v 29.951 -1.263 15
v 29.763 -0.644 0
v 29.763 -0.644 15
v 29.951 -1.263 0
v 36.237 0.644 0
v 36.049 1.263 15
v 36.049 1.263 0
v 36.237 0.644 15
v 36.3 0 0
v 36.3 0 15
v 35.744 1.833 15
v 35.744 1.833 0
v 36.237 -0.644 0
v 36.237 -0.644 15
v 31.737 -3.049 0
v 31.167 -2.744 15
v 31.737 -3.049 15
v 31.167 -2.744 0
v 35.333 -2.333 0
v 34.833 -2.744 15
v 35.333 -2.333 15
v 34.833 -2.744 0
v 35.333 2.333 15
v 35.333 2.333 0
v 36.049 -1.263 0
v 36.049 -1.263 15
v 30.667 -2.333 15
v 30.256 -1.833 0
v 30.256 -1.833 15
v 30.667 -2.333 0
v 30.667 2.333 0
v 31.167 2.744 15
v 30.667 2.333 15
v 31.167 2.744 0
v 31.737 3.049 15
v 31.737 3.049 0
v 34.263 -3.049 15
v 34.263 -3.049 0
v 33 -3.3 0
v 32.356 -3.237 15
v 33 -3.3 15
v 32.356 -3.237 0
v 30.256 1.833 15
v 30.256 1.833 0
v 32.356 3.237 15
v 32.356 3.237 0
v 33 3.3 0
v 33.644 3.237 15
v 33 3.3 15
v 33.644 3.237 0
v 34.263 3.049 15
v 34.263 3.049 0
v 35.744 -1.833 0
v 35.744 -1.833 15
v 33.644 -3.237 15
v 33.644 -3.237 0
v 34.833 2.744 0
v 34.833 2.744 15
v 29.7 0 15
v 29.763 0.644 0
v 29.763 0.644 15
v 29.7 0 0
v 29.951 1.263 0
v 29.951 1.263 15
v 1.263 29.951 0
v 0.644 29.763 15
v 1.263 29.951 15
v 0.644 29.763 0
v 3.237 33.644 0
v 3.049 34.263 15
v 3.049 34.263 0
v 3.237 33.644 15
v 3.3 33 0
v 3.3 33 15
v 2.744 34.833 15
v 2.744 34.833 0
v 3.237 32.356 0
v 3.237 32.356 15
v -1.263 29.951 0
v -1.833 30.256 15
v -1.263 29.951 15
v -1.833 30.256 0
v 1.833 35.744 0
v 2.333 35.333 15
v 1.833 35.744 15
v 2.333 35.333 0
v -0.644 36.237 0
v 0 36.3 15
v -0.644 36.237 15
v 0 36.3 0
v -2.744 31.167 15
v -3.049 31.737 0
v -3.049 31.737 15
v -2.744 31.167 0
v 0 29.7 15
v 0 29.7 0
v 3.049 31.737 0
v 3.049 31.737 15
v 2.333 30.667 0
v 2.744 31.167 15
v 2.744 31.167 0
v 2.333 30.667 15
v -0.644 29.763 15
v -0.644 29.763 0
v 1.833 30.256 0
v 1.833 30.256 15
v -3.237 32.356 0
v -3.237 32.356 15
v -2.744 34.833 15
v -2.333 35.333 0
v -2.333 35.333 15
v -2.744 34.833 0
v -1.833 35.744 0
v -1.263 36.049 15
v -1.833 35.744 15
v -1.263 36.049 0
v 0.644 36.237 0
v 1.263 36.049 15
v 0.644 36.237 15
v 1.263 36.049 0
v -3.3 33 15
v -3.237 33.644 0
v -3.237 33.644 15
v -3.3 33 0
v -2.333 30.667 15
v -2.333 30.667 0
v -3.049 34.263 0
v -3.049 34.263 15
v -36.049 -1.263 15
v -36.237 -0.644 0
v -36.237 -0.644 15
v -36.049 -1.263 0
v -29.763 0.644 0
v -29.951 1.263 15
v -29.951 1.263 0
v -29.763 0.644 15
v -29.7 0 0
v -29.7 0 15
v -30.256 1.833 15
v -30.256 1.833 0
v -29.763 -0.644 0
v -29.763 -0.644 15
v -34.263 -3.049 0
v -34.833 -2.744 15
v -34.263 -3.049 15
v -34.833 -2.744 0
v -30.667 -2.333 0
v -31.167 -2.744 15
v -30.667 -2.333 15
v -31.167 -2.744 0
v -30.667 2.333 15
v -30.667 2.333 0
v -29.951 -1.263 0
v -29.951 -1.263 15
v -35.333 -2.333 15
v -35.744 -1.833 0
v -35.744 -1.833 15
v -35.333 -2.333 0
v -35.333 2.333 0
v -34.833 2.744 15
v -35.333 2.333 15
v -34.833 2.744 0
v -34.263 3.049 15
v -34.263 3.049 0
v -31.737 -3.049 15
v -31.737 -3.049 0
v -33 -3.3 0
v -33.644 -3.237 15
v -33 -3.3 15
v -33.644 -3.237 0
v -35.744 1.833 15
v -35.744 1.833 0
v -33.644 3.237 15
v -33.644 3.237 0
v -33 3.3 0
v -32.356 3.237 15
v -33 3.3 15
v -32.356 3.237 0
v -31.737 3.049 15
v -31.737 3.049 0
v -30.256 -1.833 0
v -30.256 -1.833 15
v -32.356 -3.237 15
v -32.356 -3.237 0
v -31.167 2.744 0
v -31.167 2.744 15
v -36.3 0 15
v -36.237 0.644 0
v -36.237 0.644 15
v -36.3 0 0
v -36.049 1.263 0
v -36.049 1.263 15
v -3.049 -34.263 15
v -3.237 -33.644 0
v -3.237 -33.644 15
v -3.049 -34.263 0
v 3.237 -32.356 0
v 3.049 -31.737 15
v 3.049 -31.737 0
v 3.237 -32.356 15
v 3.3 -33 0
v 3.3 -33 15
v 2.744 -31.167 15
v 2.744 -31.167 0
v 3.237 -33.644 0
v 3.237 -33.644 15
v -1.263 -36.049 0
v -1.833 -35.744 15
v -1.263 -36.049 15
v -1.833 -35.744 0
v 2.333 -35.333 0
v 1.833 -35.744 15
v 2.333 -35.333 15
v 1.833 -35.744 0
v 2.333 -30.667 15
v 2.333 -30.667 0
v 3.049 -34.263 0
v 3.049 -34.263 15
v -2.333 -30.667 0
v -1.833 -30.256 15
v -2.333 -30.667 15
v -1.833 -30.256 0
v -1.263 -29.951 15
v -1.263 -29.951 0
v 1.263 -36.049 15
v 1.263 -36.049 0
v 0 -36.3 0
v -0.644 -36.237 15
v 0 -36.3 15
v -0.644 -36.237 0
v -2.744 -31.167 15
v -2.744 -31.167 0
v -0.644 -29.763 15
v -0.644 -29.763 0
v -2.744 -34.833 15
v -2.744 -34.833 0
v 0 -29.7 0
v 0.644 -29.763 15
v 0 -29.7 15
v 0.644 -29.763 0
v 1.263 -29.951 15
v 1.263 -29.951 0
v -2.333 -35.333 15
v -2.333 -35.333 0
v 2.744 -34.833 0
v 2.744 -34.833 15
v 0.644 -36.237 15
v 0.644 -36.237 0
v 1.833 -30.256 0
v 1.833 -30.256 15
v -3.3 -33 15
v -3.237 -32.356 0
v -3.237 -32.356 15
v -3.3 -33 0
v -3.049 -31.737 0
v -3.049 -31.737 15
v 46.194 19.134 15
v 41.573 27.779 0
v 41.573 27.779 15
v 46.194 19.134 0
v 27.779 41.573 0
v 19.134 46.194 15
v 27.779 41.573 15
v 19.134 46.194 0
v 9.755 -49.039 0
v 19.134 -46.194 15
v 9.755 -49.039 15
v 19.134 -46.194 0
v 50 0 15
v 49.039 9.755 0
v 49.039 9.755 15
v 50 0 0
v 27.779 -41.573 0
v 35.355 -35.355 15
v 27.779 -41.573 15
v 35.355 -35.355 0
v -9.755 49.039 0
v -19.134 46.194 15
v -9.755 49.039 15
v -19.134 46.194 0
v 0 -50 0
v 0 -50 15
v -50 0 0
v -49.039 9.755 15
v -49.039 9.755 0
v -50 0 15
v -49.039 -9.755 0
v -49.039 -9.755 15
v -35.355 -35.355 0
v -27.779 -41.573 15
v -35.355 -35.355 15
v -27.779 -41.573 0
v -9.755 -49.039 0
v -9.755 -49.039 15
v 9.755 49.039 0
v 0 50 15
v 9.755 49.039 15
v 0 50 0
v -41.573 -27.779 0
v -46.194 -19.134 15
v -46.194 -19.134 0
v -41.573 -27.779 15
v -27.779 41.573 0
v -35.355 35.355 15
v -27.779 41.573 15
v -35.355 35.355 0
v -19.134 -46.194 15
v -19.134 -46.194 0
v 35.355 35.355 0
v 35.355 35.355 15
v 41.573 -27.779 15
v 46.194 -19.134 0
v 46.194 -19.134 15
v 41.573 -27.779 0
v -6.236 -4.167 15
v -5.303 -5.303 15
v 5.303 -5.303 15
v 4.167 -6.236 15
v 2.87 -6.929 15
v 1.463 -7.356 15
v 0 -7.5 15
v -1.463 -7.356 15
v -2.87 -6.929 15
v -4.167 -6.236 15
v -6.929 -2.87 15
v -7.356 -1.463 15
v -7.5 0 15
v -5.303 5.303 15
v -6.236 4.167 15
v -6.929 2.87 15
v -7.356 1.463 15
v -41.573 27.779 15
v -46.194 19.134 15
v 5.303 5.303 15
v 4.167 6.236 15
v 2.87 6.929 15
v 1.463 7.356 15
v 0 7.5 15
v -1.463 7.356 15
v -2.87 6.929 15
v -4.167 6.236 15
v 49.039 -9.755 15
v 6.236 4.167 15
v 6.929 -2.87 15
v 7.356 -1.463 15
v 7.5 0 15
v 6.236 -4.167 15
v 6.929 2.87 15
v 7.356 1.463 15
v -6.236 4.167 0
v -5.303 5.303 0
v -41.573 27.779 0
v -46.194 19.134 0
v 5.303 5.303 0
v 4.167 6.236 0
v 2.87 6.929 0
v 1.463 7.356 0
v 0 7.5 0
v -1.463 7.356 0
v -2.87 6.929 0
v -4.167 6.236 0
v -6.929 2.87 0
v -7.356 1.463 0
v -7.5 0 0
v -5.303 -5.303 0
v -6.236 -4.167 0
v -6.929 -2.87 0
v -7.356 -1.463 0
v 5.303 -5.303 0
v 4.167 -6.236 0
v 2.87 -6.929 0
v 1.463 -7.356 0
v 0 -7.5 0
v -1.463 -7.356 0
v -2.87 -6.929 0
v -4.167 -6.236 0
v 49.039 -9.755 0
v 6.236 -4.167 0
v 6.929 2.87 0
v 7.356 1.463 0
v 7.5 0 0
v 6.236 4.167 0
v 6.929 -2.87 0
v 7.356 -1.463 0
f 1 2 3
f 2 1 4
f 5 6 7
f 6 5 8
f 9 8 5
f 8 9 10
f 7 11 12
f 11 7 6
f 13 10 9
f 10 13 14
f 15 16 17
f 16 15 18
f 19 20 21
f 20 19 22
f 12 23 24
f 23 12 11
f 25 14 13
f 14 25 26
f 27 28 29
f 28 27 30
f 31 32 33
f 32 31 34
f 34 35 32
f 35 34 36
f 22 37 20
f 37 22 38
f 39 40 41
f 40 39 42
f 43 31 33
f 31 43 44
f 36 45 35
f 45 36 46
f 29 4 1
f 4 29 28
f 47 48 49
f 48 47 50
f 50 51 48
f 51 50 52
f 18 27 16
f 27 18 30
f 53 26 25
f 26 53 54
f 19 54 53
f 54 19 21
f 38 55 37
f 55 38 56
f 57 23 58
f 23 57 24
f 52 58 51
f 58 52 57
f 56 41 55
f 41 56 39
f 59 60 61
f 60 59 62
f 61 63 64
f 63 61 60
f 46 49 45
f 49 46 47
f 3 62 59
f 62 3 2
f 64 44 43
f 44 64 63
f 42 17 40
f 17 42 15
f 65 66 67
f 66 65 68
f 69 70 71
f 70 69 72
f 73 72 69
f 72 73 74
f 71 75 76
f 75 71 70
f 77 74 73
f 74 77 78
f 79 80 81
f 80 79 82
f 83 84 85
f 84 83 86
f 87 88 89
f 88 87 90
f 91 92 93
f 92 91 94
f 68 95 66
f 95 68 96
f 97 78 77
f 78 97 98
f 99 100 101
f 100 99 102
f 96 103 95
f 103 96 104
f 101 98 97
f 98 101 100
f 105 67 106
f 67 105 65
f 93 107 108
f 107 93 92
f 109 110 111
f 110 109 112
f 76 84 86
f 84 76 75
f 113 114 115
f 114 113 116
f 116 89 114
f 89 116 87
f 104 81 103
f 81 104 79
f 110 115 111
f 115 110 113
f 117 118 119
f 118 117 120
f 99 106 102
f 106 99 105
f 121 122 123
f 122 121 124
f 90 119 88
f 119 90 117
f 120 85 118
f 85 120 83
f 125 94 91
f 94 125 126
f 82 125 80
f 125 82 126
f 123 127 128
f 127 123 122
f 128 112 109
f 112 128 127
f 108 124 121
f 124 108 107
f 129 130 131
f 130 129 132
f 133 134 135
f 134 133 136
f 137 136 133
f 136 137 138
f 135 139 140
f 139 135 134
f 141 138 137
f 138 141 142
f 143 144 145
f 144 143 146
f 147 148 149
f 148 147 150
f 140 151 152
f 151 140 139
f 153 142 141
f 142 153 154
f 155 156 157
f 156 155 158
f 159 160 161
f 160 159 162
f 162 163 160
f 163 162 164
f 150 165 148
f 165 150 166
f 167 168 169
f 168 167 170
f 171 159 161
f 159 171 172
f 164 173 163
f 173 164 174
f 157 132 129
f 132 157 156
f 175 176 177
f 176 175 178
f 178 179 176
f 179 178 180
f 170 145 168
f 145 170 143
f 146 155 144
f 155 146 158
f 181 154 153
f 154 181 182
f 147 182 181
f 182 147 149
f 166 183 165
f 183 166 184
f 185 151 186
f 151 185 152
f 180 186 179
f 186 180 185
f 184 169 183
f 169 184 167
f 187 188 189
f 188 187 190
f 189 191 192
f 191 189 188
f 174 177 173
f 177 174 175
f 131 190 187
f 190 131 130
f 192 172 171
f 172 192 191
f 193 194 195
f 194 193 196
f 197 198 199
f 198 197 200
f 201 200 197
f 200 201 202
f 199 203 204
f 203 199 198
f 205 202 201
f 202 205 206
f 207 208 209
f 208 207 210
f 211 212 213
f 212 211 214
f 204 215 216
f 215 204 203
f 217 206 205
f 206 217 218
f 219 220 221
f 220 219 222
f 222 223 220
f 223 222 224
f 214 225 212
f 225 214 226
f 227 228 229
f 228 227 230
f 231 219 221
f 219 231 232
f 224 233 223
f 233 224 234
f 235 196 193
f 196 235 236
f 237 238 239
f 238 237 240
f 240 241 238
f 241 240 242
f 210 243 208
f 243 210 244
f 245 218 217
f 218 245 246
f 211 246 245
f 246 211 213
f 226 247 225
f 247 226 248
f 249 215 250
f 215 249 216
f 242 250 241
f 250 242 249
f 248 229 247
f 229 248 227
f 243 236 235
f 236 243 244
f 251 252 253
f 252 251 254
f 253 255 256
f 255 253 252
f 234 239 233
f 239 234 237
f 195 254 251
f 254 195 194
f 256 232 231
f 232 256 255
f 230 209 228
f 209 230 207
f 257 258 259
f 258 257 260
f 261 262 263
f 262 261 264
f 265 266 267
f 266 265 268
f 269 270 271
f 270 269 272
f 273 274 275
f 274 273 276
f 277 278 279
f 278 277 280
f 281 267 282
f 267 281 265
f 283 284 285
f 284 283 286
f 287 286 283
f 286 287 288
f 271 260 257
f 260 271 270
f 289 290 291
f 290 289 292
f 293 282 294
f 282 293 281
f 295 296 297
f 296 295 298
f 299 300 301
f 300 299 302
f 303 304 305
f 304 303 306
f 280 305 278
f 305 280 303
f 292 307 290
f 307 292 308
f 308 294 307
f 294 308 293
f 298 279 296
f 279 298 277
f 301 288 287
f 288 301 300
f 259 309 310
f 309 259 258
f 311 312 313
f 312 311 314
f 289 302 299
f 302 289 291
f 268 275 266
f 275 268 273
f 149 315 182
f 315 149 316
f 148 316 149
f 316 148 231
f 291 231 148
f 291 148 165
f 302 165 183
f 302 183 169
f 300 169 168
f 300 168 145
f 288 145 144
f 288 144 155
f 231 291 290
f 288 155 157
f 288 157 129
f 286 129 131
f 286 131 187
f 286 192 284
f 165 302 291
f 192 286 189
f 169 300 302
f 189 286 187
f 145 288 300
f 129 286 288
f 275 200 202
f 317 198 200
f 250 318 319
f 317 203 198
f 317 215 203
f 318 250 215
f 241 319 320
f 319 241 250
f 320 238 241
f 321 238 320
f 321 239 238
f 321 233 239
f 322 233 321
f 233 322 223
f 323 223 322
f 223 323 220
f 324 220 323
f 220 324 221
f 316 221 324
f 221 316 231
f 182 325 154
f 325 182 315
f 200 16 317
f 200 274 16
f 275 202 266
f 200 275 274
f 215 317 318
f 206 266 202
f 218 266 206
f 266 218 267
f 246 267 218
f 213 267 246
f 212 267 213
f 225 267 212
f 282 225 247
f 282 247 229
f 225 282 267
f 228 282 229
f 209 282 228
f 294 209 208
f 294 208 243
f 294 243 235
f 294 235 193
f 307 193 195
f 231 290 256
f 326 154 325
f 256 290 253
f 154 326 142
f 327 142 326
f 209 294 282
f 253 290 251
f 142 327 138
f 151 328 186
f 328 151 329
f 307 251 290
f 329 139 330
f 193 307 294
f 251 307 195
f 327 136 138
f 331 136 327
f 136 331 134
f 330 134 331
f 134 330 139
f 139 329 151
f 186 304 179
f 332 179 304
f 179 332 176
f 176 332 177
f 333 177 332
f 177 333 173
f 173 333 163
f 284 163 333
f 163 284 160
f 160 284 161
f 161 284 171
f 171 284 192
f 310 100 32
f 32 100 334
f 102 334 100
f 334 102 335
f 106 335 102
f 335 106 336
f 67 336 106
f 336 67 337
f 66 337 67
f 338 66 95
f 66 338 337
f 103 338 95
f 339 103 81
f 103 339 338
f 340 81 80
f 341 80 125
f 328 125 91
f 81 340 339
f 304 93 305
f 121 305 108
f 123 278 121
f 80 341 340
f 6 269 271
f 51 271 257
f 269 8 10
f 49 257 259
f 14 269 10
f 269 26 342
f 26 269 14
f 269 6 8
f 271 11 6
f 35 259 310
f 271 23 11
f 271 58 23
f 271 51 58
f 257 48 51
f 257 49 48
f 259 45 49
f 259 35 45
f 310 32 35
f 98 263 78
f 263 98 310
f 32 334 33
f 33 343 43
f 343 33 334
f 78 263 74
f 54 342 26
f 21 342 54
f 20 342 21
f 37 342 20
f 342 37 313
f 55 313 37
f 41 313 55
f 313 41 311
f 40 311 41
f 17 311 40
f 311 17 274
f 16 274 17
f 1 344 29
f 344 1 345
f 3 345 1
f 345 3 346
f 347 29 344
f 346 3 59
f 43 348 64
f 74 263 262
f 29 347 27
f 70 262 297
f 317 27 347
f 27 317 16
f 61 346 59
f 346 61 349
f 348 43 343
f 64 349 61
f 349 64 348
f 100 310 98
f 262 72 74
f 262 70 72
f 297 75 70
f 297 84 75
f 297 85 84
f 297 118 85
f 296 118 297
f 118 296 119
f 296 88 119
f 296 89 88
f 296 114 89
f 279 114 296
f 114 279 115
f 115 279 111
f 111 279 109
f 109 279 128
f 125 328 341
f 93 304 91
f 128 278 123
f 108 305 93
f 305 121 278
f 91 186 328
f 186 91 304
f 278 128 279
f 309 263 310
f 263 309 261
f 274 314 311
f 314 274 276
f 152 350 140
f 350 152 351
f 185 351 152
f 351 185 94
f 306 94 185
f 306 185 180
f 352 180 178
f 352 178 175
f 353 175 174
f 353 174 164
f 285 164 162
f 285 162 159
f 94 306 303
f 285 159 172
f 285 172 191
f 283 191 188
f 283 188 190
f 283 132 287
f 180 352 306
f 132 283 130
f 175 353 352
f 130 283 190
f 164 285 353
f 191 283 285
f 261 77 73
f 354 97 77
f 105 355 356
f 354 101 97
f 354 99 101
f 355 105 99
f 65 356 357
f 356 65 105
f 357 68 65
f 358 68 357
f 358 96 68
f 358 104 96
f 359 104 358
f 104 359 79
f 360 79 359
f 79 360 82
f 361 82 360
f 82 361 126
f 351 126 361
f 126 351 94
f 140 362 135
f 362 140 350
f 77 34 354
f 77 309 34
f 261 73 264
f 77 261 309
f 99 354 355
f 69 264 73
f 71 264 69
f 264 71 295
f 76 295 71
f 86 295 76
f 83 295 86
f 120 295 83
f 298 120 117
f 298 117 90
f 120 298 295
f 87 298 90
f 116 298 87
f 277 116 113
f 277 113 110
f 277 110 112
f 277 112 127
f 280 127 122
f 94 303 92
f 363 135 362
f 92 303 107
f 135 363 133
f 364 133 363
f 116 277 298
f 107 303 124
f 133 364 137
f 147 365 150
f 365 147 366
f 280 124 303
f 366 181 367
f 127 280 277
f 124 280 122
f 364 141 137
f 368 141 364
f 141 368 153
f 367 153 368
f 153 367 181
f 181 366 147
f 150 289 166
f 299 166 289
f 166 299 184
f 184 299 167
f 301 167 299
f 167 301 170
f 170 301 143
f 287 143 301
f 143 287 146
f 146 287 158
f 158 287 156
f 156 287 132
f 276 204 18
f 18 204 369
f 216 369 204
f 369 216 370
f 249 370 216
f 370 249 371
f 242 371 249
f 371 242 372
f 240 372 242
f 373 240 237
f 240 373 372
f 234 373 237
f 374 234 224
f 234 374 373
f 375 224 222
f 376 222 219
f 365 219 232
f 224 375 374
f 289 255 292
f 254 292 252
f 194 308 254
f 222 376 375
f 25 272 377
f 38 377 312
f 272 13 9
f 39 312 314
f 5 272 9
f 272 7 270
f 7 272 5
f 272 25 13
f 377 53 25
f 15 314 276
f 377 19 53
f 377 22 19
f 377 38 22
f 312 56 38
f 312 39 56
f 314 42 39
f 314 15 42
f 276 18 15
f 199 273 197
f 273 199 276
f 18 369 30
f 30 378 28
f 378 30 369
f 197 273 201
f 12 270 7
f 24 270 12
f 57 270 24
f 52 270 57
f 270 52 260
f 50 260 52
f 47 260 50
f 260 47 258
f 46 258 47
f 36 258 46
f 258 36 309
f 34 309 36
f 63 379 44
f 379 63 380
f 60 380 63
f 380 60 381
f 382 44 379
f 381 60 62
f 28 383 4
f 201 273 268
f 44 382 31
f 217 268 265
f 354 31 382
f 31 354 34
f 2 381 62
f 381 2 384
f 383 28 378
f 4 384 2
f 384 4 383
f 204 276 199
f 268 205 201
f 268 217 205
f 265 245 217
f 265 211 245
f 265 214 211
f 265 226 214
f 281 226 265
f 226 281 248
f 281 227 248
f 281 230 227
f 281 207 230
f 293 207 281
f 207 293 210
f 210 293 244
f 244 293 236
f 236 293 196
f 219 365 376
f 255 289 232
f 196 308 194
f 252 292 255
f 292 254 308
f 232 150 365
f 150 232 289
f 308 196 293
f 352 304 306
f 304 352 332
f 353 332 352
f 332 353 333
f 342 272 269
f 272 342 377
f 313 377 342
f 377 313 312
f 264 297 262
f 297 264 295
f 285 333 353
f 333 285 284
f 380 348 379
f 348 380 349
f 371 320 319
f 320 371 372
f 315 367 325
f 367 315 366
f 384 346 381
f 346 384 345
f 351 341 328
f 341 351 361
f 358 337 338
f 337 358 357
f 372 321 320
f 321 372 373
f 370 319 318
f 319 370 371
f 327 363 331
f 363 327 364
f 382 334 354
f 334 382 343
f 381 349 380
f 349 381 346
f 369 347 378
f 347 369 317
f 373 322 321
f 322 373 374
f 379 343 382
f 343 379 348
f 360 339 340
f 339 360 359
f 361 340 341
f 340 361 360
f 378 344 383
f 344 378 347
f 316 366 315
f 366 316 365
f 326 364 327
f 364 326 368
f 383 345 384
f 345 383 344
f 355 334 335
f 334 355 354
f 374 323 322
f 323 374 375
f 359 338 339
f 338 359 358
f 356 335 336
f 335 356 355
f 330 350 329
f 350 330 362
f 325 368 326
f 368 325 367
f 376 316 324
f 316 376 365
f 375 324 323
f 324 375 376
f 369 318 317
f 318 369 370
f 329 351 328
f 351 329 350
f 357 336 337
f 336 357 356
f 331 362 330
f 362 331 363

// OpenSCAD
$fn = 32;

// ----------------------------------------------------------------------
// Flange Ø100 x 15
// 4 holes on a Ø66 bolt circle, bolted joints
// ----------------------------------------------------------------------

// --- parameters (mm) ---
flange_d = 100;  // outside diameter of the flange
thickness = 15;  // flange thickness
holes = 4;       // number of bolt holes
pcd = 66;        // bolt circle diameter
start_deg = 0;   // angle of the first hole, from +X
hole_d = 6.6;    // bolt hole diameter
bore_d = 15;     // central through bore
hub_d = 27;      // hub outside diameter
hub_h = 0;       // hub height above the flange face (0 = no hub)

// --- derived feature positions (mm) ---
height = thickness + hub_h;  // = 15   overall height of the part
pcd_r = pcd / 2;             // = 33   bolt circle radius
hole_step = 360 / holes;     // = 90   angular pitch
feature_centers = [
  [pcd_r * cos(start_deg + 0 * hole_step), pcd_r * sin(start_deg + 0 * hole_step)],
  [pcd_r * cos(start_deg + 1 * hole_step), pcd_r * sin(start_deg + 1 * hole_step)],
  [pcd_r * cos(start_deg + 2 * hole_step), pcd_r * sin(start_deg + 2 * hole_step)],
  [pcd_r * cos(start_deg + 3 * hole_step), pcd_r * sin(start_deg + 3 * hole_step)]
];   // bolt hole centres on the pitch circle

// flange disc, every hole and the bore cut straight through
difference() {
  union() {
    cylinder(d = flange_d, h = thickness);
  }
  translate([0, 0, -1]) cylinder(d = bore_d, h = height + 2);  // bore, through
  for (centre = feature_centers)
    translate([centre[0], centre[1], -1]) cylinder(d = hole_d, h = thickness + 2);
}
